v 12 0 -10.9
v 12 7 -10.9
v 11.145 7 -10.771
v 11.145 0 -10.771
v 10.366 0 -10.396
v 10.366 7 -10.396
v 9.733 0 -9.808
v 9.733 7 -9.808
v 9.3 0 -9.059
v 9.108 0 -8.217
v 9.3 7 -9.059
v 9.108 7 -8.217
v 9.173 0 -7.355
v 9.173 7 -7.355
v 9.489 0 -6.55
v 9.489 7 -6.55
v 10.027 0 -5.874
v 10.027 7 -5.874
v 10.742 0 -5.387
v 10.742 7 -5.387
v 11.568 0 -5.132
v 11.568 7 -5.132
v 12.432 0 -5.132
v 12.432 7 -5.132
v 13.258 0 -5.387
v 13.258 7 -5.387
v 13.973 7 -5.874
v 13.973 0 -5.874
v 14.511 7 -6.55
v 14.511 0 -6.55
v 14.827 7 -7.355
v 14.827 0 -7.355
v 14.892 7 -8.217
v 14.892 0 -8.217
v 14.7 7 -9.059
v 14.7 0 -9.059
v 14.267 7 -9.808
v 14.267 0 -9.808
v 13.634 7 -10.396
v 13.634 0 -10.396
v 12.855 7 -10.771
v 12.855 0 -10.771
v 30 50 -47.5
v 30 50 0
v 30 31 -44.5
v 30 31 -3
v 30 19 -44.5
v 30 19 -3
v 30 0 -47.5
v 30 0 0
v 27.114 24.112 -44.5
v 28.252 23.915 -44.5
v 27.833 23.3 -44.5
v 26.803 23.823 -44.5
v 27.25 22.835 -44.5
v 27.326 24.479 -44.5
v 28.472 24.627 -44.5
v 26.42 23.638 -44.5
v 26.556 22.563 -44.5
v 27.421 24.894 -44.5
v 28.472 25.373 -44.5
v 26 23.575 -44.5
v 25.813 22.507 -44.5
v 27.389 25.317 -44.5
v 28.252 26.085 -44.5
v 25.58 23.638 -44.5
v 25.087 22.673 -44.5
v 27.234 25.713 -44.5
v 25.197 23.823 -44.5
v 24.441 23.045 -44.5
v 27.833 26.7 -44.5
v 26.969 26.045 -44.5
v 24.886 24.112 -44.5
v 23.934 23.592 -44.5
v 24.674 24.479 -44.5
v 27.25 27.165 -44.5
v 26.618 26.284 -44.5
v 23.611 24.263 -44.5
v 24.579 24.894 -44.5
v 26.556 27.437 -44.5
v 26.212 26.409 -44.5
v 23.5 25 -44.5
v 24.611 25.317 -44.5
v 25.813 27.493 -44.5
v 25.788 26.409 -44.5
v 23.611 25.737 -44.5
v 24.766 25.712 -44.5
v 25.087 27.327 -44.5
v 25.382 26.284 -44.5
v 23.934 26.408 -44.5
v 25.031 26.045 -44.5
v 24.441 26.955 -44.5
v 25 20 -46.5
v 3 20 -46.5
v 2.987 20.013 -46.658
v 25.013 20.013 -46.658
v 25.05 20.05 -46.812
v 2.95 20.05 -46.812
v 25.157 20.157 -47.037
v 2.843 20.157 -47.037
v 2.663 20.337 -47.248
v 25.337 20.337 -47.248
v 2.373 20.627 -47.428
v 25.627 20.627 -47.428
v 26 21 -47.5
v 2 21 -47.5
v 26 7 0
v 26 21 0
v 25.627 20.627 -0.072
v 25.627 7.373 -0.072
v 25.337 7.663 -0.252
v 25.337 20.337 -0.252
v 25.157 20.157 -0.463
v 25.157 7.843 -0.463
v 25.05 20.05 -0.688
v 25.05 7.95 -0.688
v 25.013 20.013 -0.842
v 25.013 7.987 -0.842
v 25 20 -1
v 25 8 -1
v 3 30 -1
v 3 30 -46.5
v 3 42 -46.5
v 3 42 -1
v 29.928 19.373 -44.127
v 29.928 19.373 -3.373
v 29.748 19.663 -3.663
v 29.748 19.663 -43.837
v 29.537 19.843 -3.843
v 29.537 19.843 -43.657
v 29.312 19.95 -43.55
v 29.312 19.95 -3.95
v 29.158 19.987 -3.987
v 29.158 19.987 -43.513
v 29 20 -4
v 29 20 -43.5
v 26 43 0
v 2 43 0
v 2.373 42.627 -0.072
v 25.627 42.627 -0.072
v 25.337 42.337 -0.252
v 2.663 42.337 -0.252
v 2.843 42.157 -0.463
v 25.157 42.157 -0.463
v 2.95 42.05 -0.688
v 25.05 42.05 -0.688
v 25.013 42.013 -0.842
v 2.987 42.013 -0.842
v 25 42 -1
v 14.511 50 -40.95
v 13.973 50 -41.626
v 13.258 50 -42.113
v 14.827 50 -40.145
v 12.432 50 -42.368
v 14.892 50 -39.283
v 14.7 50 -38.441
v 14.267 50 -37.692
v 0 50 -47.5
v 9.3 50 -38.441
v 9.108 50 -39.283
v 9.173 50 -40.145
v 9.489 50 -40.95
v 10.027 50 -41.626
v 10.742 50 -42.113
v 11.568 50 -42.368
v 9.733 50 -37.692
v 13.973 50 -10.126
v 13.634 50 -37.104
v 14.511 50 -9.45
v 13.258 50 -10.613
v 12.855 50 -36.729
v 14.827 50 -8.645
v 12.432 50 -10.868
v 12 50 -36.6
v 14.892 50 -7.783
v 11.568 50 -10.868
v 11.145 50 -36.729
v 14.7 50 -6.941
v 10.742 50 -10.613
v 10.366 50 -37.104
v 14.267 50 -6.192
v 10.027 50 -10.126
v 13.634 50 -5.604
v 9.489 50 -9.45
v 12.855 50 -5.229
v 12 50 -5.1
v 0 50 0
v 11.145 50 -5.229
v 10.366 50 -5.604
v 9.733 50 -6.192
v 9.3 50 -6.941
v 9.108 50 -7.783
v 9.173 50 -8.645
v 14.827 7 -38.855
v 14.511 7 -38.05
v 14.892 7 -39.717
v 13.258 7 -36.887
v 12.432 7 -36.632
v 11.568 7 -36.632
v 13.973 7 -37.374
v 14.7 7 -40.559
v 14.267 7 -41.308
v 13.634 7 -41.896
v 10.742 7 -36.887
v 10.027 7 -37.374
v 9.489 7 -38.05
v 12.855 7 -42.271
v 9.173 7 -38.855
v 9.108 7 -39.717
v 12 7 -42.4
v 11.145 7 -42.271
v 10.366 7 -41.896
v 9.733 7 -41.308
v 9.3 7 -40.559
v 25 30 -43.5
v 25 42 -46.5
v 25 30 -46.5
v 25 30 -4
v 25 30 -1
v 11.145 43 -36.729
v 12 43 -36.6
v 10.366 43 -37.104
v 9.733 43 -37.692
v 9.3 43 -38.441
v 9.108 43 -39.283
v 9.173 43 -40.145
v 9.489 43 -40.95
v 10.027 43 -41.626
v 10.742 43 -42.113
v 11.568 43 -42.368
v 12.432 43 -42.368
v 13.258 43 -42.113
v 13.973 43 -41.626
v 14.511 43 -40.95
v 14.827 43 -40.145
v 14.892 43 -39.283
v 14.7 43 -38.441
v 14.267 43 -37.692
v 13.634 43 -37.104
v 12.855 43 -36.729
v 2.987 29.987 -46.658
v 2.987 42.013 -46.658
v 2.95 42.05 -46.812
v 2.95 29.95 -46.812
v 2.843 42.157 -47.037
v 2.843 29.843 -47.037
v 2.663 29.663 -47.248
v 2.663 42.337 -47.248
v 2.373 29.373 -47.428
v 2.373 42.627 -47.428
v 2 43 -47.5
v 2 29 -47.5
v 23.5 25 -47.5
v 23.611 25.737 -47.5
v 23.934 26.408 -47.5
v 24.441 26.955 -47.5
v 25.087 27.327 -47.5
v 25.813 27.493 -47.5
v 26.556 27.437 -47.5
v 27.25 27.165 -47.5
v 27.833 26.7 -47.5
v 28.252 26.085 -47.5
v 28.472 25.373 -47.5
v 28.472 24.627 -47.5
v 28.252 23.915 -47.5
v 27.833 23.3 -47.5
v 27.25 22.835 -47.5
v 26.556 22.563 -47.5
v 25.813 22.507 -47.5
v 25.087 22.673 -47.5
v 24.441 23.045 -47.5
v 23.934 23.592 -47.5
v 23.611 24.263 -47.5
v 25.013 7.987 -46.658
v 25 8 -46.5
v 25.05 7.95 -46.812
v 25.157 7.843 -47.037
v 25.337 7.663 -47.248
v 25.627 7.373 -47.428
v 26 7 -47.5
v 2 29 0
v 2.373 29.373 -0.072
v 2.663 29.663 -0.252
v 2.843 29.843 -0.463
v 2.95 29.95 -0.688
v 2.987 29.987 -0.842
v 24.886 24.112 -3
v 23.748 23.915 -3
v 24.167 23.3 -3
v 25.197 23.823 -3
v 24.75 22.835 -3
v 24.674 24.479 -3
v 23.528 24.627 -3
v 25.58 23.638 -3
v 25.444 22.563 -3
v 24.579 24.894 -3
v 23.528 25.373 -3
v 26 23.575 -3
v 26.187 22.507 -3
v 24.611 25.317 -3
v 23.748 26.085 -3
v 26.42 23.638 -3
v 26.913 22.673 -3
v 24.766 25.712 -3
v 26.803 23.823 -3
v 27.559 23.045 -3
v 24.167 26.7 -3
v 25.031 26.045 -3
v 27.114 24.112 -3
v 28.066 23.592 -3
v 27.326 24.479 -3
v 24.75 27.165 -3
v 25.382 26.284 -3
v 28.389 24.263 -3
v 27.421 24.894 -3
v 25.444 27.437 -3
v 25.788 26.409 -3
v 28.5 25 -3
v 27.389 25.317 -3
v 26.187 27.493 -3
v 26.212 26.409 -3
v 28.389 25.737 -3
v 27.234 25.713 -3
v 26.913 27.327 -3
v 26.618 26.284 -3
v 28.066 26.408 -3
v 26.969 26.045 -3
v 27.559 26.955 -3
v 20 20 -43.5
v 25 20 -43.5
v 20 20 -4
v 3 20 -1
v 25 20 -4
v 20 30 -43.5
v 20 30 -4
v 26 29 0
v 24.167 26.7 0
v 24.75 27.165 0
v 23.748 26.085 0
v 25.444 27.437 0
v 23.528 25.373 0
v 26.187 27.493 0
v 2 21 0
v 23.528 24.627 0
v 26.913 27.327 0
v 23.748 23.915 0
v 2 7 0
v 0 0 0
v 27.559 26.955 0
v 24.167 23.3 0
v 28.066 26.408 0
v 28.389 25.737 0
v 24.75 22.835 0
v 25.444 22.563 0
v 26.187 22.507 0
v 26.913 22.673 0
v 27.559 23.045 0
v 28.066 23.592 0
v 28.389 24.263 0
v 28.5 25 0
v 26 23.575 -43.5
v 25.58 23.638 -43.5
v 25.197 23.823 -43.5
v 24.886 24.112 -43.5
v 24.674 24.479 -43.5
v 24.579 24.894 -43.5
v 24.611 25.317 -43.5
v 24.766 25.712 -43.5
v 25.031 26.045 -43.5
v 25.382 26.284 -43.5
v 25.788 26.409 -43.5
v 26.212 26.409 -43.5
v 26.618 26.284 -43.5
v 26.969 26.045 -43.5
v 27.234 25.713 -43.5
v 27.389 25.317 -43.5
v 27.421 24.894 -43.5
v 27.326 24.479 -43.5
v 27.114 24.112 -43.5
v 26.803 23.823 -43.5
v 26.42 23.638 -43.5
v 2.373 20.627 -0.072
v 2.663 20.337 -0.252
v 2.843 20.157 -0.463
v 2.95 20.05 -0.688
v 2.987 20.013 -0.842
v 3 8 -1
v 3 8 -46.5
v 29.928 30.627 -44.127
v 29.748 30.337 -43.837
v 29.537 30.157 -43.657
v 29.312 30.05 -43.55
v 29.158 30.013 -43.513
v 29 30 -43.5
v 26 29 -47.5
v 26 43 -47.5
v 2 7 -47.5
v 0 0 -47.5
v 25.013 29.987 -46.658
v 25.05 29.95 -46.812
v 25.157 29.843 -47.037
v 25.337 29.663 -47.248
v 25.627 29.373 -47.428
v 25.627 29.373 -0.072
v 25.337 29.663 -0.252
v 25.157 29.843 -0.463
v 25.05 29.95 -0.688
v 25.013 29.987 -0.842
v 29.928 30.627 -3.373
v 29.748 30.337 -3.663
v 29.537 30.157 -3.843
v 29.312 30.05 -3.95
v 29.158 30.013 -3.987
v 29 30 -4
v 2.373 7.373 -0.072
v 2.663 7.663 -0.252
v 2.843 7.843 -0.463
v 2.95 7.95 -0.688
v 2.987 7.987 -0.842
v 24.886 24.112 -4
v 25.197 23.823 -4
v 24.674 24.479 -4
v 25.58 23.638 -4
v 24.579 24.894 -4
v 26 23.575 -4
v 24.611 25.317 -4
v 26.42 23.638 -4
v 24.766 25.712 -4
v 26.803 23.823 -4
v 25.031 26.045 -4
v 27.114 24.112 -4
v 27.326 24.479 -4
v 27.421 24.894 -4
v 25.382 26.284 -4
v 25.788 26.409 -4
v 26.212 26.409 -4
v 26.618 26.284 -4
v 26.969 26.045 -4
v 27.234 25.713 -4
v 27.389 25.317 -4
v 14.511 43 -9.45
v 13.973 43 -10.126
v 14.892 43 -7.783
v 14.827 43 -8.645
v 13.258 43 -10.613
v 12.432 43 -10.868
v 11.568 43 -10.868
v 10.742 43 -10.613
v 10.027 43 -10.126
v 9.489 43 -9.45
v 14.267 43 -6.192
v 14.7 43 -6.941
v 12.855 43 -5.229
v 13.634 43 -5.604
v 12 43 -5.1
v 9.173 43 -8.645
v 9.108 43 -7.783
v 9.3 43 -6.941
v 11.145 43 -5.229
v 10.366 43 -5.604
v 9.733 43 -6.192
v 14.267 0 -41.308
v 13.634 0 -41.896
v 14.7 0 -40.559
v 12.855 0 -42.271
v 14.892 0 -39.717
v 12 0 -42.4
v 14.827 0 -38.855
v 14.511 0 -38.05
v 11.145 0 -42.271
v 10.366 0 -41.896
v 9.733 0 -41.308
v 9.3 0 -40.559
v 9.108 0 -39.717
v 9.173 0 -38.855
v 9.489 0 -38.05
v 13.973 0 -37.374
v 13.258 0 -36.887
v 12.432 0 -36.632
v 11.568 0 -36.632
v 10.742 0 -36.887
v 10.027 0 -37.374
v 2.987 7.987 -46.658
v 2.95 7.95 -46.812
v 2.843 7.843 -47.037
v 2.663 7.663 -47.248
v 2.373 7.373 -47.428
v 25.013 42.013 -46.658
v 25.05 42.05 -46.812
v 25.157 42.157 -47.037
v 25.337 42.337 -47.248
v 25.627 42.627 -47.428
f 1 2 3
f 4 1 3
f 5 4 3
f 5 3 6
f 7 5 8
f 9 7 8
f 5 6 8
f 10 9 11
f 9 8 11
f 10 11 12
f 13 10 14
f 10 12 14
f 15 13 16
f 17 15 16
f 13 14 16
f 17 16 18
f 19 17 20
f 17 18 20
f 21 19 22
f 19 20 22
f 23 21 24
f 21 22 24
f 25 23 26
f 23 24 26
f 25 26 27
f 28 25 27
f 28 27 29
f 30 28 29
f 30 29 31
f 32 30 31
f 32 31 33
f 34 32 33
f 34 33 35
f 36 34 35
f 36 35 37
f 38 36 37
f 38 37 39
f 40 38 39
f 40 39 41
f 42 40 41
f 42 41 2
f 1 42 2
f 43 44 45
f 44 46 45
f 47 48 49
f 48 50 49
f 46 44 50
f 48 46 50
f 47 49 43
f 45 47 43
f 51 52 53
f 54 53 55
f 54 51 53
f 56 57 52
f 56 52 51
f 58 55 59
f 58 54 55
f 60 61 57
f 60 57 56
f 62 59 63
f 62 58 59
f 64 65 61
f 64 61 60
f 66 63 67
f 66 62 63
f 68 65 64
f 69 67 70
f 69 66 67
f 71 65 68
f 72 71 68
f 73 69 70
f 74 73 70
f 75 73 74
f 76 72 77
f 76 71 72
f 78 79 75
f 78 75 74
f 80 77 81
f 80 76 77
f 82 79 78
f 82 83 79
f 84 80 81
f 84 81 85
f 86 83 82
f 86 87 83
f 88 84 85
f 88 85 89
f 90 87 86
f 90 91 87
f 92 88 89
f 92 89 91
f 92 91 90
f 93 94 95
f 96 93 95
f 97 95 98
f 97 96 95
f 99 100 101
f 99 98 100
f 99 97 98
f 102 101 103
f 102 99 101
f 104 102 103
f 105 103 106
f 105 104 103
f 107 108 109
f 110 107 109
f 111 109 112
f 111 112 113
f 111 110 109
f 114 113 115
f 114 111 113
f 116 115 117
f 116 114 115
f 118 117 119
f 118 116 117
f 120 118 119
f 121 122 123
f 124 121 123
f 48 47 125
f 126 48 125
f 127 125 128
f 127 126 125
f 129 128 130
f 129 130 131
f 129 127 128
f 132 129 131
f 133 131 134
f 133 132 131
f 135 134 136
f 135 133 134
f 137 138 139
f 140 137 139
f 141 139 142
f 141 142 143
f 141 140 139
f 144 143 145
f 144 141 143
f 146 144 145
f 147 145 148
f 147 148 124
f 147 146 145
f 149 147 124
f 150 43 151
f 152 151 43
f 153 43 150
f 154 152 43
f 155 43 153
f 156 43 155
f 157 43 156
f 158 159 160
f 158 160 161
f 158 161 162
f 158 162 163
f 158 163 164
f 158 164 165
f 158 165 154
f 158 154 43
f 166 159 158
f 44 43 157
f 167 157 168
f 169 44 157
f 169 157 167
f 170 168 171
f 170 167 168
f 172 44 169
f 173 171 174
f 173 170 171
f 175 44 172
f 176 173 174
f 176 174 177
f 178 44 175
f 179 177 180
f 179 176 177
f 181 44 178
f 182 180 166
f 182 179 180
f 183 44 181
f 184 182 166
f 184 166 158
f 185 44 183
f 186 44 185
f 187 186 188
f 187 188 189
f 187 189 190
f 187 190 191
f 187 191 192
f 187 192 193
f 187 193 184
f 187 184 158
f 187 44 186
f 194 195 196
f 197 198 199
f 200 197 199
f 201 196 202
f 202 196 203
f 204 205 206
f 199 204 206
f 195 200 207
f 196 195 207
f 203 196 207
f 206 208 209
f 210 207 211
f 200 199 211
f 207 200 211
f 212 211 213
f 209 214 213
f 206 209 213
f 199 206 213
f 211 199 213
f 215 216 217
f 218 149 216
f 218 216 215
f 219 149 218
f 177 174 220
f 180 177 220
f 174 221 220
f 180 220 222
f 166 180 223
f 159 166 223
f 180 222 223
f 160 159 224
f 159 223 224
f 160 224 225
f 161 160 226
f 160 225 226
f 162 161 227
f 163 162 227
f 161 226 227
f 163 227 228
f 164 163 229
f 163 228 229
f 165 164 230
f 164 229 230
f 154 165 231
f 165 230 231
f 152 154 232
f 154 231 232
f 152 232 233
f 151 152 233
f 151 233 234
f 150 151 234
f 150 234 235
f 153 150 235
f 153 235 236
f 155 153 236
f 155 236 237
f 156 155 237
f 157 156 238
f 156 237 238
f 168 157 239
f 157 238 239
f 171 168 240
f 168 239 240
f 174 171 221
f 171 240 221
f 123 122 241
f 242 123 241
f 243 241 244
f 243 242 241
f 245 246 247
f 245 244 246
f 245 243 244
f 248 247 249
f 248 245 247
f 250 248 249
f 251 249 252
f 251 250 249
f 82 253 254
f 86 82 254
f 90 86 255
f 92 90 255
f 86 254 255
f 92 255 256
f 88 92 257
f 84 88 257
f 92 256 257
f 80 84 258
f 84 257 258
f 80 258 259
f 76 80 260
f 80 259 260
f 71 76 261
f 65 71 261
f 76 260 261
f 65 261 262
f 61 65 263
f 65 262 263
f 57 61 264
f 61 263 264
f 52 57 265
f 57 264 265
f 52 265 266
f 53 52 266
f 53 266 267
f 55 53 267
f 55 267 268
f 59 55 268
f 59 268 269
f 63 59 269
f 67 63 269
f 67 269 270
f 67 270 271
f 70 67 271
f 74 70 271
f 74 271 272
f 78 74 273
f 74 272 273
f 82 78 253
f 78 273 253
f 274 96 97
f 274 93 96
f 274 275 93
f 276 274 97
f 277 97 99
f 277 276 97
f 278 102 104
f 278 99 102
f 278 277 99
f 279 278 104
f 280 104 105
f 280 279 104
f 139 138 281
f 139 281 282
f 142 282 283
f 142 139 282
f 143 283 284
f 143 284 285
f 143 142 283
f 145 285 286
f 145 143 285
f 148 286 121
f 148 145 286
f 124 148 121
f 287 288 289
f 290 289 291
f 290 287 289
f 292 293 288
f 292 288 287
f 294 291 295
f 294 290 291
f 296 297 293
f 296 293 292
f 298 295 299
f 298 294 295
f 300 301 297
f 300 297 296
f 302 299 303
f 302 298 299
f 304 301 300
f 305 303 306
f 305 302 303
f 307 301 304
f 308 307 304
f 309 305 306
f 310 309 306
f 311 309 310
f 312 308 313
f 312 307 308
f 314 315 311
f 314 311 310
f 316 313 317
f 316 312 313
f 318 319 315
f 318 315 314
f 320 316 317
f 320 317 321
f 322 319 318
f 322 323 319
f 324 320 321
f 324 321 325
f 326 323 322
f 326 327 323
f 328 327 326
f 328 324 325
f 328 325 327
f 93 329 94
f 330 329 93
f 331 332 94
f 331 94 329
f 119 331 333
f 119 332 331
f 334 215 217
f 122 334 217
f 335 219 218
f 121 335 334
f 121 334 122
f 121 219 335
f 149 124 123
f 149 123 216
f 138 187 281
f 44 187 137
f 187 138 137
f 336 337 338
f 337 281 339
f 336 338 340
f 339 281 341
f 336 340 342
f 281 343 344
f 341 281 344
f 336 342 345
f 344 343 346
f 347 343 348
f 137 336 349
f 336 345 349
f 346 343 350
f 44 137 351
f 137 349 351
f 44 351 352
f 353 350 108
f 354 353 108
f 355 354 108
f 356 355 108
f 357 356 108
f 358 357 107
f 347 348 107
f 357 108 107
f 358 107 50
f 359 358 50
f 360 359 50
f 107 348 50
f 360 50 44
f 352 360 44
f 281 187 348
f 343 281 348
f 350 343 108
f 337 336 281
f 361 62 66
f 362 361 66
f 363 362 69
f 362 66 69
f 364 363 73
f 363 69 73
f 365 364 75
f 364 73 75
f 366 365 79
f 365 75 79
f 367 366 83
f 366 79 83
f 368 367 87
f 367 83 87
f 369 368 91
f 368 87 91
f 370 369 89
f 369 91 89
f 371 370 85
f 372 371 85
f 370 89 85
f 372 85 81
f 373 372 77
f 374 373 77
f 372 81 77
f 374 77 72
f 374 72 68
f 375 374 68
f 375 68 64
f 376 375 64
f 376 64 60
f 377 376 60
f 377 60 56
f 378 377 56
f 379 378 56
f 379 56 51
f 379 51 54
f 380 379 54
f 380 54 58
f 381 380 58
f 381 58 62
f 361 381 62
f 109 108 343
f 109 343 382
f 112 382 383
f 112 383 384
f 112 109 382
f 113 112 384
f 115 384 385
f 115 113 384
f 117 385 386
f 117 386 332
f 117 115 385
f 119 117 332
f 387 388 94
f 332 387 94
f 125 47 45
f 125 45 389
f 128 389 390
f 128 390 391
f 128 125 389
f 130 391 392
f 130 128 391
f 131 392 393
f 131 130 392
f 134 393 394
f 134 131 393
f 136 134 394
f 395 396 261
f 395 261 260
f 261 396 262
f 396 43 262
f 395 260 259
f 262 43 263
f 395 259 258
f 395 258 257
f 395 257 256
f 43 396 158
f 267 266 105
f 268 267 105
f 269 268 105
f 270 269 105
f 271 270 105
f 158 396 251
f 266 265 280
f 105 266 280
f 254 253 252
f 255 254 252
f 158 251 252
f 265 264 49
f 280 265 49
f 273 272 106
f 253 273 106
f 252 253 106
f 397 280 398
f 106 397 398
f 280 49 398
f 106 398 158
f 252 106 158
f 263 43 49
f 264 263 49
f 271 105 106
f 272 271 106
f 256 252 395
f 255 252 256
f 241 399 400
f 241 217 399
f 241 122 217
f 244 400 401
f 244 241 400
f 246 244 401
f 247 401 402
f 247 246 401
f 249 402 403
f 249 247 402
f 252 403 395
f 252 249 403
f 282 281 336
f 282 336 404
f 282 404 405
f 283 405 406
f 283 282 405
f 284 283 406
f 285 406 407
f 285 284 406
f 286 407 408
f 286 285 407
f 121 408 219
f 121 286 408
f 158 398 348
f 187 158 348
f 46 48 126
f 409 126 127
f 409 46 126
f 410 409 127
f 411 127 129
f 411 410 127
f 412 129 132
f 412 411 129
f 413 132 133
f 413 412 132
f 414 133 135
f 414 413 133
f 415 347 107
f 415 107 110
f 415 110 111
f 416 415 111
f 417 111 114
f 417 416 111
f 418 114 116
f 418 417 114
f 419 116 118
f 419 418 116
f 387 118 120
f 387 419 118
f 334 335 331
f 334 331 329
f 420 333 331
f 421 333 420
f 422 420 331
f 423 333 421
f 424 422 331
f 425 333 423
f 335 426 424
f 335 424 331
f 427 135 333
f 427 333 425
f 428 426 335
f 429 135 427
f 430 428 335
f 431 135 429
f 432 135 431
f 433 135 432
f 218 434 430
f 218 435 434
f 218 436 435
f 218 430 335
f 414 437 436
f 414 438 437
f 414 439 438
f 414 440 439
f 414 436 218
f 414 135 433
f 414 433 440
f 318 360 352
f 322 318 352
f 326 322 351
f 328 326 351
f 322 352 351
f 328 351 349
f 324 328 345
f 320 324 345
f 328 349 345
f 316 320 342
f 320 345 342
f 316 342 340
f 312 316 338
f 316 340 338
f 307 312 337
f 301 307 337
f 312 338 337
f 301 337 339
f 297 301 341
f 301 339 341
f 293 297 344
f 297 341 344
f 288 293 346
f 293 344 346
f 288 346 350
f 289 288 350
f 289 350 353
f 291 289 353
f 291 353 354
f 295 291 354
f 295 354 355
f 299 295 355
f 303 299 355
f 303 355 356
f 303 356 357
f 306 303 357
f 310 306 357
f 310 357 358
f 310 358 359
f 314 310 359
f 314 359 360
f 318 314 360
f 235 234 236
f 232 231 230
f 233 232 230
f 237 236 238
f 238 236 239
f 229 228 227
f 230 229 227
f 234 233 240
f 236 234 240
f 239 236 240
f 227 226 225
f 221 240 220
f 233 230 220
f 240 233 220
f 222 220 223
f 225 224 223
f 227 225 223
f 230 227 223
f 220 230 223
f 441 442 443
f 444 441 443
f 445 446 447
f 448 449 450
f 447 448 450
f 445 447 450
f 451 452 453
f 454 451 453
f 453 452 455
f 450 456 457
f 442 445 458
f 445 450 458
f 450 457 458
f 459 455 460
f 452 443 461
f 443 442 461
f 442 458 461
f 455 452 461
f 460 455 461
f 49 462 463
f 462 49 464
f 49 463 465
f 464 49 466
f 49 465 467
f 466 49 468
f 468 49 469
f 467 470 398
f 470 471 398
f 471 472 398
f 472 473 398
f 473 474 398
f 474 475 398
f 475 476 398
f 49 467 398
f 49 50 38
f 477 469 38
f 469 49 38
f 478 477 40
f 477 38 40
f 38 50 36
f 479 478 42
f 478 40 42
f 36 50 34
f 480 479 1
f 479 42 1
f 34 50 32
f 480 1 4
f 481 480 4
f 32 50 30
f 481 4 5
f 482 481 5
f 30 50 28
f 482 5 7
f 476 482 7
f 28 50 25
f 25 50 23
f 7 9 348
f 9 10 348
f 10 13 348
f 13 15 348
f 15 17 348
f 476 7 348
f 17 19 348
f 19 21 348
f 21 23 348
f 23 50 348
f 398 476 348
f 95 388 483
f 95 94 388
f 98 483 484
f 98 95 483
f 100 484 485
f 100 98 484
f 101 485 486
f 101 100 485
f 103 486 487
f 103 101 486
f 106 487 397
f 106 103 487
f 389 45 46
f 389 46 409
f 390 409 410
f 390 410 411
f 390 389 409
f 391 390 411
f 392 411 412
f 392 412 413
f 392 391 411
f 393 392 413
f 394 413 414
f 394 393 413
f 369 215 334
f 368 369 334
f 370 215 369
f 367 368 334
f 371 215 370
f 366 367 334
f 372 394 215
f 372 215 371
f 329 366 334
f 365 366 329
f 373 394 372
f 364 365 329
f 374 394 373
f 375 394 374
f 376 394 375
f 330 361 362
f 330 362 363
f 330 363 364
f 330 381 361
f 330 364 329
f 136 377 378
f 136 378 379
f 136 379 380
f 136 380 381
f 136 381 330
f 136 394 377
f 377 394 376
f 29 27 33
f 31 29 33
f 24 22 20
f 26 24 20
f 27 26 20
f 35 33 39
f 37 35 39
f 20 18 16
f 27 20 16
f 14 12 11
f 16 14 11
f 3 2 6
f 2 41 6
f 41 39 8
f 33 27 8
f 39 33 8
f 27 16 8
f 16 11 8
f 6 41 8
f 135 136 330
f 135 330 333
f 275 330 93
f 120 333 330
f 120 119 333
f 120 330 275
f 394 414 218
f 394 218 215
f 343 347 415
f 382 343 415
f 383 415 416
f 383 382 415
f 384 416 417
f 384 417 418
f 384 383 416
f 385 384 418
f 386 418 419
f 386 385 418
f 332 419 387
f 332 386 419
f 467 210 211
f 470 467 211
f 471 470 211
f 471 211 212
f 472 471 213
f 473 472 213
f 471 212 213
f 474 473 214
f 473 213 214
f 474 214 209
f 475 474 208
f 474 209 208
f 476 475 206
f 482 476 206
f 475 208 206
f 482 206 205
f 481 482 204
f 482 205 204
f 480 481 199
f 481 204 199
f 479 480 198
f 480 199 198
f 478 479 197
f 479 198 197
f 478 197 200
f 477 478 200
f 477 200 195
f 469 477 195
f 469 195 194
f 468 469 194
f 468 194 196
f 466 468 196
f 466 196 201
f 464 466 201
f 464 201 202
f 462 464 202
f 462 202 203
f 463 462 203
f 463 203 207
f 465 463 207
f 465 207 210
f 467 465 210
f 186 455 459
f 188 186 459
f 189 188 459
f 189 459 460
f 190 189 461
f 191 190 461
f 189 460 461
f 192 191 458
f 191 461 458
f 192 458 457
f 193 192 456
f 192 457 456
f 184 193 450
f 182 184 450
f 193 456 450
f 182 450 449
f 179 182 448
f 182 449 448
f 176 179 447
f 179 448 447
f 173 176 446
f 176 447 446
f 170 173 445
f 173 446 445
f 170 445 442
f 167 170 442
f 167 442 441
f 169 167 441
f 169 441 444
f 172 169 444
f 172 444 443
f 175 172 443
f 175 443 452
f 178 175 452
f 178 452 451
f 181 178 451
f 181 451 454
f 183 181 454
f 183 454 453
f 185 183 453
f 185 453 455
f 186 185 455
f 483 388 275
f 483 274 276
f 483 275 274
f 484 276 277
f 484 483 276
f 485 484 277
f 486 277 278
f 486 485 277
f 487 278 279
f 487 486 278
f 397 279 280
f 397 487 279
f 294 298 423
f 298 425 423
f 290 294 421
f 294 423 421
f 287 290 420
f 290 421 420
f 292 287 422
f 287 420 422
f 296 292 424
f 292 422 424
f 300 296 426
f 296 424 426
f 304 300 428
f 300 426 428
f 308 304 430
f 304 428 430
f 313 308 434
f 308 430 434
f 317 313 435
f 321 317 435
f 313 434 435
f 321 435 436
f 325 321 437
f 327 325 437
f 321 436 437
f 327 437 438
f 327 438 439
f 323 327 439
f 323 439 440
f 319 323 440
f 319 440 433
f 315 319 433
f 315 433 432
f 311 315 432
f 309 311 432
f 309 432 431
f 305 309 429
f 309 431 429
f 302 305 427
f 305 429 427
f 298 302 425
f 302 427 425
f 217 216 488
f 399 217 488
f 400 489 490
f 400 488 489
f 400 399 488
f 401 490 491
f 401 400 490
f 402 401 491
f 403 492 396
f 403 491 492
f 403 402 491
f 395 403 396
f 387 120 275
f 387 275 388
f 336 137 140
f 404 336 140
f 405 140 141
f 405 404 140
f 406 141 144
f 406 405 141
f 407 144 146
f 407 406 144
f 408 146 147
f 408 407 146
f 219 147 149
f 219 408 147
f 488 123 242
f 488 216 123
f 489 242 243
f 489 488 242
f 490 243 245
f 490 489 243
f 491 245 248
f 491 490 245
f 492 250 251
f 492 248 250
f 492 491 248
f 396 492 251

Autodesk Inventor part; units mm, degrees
ref_plane "YZ Plane" through (0, 0, 0) normal (1, 0, 0) x (0, 1, 0)
ref_plane "XZ Plane" through (0, 0, 0) normal (0, 1, 0) x (-1, 0, 0)
ref_plane "XY Plane" through (0, 0, 0) normal (0, 0, 1) x (1, 0, 0)
sketch "スケッチ1" plane through (0, 0, 0) normal (0, 1, 0) x (-1, 0, 0)
  line L0 (0, 0) -> (-30, 0)
  line L1 (-30, 0) -> (-30, -47.5)
  line L2 (-30, -47.5) -> (0, -47.5)
  line L3 (0, -47.5) -> (0, 0)
  dimension "d0" = 30
  dimension "d1" = 47.5
extrude "押し出し1" add sketch "スケッチ1" along normal blind 50
ref_plane "作業平面1" through (30, 0, 0) normal (1, 0, 0) x (0, 0, -1)
sketch "スケッチ2" plane through (30, 0, 0) normal (1, 0, 0) x (0, 0, -1)
  line L0 (4, 30) -> (43.5, 30)
  line L1 (43.5, 30) -> (43.5, 20)
  line L2 (43.5, 20) -> (4, 20)
  line L3 (4, 20) -> (4, 30)
  line L4 (0, 0) -> (0, 50) projected
  line L5 (0, 0) -> (0, 50) projected
  line L6 (0, 50) -> (47.5, 50) projected
  point P0 (0, 25)
  point P1 (4, 25)
  point P2 (0, 25)
  point P3 (23.75, 30)
  point P4 (23.75, 50)
  point P5 (23.75, 50)
  dimension "d5" = 39.5
  dimension "d6" = 10
  dimension "d7" = 0
  dimension "d8" = 0
extrude "押し出し2" cut sketch "スケッチ2" against normal blind 10
sketch "スケッチ3" plane through (0, 0, 0) normal (0, 0, 1) x (1, 0, 0)
  line L0 (3, 42) -> (25, 42)
  line L1 (25, 42) -> (25, 30)
  line L2 (25, 30) -> (3, 30)
  line L3 (3, 30) -> (3, 42)
  line L4 (0, 50) -> (30, 50) projected
  line L5 (3, 20) -> (25, 20)
  line L6 (25, 20) -> (25, 8)
  line L7 (25, 8) -> (3, 8)
  line L8 (3, 8) -> (3, 20)
  line L9 (0, 0) -> (30, 0) projected
  line L10 (0, 0) -> (0, 50) projected
  point P0 (14, 42)
  point P1 (15, 50)
  point P2 (15, 50)
  point P3 (14, 8)
  point P4 (15, 0)
  point P5 (15, 0)
  dimension "d11" = 22
  dimension "d12" = 12
  dimension "d13" = 8
  dimension "d14" = 22
  dimension "d15" = 12
  dimension "d16" = 8
  dimension "d48" = 3
  dimension "d49" = 3
extrude "押し出し3" cut sketch "スケッチ3" against normal through all
ref_plane "作業平面2" through (0, 50, 0) normal (0, 1, 0) x (1, 0, 0)
sketch "スケッチ4" plane through (0, 50, 0) normal (0, 1, 0) x (1, 0, 0)
  line L0 (30, 57) -> (30, -9.5) projected
  line L1 (30, 47.5) -> (0, 47.5) projected
  line L2 (0, 0) -> (30, 0) projected
  line L3 (0, 47.5) -> (0, 0) projected
  point P0 (12, 39.5)
  point P1 (12, 8)
  dimension "d24" = 8
  dimension "d25" = 8
  dimension "d52" = 12
  dimension "d53" = 12
hole "穴1" at (12, 50, -39.5) at (12, 50, -8) direction (0, -1, 0) diameter 5.8 depth 7
sketch "スケッチ5" plane through (0, 0, 0) normal (0, 0, 1) x (1, 0, 0)
  line L0 (30, 0) -> (30, 50) projected
  circle A0 centre (26, 25) radius 1.5
  point P0 (0, 0)
  point P1 (30, 25)
  point P2 (30, 25)
  dimension "d33" = 4
  dimension "d34" = 3
hole "穴2" at (26, 25, 0) direction (0, 0, -1) diameter 2.85 end through all
sketch "スケッチ6" plane through (0, 0, 0) normal (0, 0, 1) x (1, 0, 0)
  circle A0 centre (26, 25) radius 1.425 projected
  circle A1 centre (26, 25) radius 2.5
  point P0 (0, 0)
  dimension "d42" = 5
extrude "押し出し4" cut sketch "スケッチ6" against normal blind 3 contours A0 | A1
sketch "スケッチ7" plane through (30, 0, -47.5) normal (0, 0, -1) x (-1, 0, 0)
  circle A0 centre (4, 25) radius 1.425 projected
  circle A1 centre (4, 25) radius 2.5
  point P0 (30, 0)
  dimension "d45" = 5
extrude "押し出し5" cut sketch "スケッチ7" against normal blind 3 contours A0 | A1
fillet "フィレット1" radius 1 4 edges at (30, 25, -43.5) (30, 30, -23.75) (30, 20, -23.75) (30, 25, -4)
fillet "フィレット2" radius 1 16 edges at (3, 36, 0) (14, 42, 0) (14, 30, 0) (25, 36, 0) (25, 14, 0) (14, 20, 0) (3, 14, 0) (14, 8, 0) (3, 36, -47.5) (14, 42, -47.5) (25, 36, -47.5) (14, 30, -47.5) (14, 20, -47.5) (3, 14, -47.5) (25, 14, -47.5) (14, 8, -47.5)
ref_plane "作業平面3" through (0, 0, 0) normal (0, -1, 0) x (1, 0, 0)
sketch "スケッチ8" plane through (0, 0, 0) normal (0, -1, 0) x (1, 0, 0)
  circle A0 centre (12, -8) radius 2.9 projected
  circle A1 centre (12, -39.5) radius 2.9 projected
  point P0 (0, 0)
hole "穴3" at (12, 0, -8) at (12, 0, -39.5) direction (0, 1, 0) diameter 5.8 depth 7
properties part number "motor_rot_born1_3D プリント"
